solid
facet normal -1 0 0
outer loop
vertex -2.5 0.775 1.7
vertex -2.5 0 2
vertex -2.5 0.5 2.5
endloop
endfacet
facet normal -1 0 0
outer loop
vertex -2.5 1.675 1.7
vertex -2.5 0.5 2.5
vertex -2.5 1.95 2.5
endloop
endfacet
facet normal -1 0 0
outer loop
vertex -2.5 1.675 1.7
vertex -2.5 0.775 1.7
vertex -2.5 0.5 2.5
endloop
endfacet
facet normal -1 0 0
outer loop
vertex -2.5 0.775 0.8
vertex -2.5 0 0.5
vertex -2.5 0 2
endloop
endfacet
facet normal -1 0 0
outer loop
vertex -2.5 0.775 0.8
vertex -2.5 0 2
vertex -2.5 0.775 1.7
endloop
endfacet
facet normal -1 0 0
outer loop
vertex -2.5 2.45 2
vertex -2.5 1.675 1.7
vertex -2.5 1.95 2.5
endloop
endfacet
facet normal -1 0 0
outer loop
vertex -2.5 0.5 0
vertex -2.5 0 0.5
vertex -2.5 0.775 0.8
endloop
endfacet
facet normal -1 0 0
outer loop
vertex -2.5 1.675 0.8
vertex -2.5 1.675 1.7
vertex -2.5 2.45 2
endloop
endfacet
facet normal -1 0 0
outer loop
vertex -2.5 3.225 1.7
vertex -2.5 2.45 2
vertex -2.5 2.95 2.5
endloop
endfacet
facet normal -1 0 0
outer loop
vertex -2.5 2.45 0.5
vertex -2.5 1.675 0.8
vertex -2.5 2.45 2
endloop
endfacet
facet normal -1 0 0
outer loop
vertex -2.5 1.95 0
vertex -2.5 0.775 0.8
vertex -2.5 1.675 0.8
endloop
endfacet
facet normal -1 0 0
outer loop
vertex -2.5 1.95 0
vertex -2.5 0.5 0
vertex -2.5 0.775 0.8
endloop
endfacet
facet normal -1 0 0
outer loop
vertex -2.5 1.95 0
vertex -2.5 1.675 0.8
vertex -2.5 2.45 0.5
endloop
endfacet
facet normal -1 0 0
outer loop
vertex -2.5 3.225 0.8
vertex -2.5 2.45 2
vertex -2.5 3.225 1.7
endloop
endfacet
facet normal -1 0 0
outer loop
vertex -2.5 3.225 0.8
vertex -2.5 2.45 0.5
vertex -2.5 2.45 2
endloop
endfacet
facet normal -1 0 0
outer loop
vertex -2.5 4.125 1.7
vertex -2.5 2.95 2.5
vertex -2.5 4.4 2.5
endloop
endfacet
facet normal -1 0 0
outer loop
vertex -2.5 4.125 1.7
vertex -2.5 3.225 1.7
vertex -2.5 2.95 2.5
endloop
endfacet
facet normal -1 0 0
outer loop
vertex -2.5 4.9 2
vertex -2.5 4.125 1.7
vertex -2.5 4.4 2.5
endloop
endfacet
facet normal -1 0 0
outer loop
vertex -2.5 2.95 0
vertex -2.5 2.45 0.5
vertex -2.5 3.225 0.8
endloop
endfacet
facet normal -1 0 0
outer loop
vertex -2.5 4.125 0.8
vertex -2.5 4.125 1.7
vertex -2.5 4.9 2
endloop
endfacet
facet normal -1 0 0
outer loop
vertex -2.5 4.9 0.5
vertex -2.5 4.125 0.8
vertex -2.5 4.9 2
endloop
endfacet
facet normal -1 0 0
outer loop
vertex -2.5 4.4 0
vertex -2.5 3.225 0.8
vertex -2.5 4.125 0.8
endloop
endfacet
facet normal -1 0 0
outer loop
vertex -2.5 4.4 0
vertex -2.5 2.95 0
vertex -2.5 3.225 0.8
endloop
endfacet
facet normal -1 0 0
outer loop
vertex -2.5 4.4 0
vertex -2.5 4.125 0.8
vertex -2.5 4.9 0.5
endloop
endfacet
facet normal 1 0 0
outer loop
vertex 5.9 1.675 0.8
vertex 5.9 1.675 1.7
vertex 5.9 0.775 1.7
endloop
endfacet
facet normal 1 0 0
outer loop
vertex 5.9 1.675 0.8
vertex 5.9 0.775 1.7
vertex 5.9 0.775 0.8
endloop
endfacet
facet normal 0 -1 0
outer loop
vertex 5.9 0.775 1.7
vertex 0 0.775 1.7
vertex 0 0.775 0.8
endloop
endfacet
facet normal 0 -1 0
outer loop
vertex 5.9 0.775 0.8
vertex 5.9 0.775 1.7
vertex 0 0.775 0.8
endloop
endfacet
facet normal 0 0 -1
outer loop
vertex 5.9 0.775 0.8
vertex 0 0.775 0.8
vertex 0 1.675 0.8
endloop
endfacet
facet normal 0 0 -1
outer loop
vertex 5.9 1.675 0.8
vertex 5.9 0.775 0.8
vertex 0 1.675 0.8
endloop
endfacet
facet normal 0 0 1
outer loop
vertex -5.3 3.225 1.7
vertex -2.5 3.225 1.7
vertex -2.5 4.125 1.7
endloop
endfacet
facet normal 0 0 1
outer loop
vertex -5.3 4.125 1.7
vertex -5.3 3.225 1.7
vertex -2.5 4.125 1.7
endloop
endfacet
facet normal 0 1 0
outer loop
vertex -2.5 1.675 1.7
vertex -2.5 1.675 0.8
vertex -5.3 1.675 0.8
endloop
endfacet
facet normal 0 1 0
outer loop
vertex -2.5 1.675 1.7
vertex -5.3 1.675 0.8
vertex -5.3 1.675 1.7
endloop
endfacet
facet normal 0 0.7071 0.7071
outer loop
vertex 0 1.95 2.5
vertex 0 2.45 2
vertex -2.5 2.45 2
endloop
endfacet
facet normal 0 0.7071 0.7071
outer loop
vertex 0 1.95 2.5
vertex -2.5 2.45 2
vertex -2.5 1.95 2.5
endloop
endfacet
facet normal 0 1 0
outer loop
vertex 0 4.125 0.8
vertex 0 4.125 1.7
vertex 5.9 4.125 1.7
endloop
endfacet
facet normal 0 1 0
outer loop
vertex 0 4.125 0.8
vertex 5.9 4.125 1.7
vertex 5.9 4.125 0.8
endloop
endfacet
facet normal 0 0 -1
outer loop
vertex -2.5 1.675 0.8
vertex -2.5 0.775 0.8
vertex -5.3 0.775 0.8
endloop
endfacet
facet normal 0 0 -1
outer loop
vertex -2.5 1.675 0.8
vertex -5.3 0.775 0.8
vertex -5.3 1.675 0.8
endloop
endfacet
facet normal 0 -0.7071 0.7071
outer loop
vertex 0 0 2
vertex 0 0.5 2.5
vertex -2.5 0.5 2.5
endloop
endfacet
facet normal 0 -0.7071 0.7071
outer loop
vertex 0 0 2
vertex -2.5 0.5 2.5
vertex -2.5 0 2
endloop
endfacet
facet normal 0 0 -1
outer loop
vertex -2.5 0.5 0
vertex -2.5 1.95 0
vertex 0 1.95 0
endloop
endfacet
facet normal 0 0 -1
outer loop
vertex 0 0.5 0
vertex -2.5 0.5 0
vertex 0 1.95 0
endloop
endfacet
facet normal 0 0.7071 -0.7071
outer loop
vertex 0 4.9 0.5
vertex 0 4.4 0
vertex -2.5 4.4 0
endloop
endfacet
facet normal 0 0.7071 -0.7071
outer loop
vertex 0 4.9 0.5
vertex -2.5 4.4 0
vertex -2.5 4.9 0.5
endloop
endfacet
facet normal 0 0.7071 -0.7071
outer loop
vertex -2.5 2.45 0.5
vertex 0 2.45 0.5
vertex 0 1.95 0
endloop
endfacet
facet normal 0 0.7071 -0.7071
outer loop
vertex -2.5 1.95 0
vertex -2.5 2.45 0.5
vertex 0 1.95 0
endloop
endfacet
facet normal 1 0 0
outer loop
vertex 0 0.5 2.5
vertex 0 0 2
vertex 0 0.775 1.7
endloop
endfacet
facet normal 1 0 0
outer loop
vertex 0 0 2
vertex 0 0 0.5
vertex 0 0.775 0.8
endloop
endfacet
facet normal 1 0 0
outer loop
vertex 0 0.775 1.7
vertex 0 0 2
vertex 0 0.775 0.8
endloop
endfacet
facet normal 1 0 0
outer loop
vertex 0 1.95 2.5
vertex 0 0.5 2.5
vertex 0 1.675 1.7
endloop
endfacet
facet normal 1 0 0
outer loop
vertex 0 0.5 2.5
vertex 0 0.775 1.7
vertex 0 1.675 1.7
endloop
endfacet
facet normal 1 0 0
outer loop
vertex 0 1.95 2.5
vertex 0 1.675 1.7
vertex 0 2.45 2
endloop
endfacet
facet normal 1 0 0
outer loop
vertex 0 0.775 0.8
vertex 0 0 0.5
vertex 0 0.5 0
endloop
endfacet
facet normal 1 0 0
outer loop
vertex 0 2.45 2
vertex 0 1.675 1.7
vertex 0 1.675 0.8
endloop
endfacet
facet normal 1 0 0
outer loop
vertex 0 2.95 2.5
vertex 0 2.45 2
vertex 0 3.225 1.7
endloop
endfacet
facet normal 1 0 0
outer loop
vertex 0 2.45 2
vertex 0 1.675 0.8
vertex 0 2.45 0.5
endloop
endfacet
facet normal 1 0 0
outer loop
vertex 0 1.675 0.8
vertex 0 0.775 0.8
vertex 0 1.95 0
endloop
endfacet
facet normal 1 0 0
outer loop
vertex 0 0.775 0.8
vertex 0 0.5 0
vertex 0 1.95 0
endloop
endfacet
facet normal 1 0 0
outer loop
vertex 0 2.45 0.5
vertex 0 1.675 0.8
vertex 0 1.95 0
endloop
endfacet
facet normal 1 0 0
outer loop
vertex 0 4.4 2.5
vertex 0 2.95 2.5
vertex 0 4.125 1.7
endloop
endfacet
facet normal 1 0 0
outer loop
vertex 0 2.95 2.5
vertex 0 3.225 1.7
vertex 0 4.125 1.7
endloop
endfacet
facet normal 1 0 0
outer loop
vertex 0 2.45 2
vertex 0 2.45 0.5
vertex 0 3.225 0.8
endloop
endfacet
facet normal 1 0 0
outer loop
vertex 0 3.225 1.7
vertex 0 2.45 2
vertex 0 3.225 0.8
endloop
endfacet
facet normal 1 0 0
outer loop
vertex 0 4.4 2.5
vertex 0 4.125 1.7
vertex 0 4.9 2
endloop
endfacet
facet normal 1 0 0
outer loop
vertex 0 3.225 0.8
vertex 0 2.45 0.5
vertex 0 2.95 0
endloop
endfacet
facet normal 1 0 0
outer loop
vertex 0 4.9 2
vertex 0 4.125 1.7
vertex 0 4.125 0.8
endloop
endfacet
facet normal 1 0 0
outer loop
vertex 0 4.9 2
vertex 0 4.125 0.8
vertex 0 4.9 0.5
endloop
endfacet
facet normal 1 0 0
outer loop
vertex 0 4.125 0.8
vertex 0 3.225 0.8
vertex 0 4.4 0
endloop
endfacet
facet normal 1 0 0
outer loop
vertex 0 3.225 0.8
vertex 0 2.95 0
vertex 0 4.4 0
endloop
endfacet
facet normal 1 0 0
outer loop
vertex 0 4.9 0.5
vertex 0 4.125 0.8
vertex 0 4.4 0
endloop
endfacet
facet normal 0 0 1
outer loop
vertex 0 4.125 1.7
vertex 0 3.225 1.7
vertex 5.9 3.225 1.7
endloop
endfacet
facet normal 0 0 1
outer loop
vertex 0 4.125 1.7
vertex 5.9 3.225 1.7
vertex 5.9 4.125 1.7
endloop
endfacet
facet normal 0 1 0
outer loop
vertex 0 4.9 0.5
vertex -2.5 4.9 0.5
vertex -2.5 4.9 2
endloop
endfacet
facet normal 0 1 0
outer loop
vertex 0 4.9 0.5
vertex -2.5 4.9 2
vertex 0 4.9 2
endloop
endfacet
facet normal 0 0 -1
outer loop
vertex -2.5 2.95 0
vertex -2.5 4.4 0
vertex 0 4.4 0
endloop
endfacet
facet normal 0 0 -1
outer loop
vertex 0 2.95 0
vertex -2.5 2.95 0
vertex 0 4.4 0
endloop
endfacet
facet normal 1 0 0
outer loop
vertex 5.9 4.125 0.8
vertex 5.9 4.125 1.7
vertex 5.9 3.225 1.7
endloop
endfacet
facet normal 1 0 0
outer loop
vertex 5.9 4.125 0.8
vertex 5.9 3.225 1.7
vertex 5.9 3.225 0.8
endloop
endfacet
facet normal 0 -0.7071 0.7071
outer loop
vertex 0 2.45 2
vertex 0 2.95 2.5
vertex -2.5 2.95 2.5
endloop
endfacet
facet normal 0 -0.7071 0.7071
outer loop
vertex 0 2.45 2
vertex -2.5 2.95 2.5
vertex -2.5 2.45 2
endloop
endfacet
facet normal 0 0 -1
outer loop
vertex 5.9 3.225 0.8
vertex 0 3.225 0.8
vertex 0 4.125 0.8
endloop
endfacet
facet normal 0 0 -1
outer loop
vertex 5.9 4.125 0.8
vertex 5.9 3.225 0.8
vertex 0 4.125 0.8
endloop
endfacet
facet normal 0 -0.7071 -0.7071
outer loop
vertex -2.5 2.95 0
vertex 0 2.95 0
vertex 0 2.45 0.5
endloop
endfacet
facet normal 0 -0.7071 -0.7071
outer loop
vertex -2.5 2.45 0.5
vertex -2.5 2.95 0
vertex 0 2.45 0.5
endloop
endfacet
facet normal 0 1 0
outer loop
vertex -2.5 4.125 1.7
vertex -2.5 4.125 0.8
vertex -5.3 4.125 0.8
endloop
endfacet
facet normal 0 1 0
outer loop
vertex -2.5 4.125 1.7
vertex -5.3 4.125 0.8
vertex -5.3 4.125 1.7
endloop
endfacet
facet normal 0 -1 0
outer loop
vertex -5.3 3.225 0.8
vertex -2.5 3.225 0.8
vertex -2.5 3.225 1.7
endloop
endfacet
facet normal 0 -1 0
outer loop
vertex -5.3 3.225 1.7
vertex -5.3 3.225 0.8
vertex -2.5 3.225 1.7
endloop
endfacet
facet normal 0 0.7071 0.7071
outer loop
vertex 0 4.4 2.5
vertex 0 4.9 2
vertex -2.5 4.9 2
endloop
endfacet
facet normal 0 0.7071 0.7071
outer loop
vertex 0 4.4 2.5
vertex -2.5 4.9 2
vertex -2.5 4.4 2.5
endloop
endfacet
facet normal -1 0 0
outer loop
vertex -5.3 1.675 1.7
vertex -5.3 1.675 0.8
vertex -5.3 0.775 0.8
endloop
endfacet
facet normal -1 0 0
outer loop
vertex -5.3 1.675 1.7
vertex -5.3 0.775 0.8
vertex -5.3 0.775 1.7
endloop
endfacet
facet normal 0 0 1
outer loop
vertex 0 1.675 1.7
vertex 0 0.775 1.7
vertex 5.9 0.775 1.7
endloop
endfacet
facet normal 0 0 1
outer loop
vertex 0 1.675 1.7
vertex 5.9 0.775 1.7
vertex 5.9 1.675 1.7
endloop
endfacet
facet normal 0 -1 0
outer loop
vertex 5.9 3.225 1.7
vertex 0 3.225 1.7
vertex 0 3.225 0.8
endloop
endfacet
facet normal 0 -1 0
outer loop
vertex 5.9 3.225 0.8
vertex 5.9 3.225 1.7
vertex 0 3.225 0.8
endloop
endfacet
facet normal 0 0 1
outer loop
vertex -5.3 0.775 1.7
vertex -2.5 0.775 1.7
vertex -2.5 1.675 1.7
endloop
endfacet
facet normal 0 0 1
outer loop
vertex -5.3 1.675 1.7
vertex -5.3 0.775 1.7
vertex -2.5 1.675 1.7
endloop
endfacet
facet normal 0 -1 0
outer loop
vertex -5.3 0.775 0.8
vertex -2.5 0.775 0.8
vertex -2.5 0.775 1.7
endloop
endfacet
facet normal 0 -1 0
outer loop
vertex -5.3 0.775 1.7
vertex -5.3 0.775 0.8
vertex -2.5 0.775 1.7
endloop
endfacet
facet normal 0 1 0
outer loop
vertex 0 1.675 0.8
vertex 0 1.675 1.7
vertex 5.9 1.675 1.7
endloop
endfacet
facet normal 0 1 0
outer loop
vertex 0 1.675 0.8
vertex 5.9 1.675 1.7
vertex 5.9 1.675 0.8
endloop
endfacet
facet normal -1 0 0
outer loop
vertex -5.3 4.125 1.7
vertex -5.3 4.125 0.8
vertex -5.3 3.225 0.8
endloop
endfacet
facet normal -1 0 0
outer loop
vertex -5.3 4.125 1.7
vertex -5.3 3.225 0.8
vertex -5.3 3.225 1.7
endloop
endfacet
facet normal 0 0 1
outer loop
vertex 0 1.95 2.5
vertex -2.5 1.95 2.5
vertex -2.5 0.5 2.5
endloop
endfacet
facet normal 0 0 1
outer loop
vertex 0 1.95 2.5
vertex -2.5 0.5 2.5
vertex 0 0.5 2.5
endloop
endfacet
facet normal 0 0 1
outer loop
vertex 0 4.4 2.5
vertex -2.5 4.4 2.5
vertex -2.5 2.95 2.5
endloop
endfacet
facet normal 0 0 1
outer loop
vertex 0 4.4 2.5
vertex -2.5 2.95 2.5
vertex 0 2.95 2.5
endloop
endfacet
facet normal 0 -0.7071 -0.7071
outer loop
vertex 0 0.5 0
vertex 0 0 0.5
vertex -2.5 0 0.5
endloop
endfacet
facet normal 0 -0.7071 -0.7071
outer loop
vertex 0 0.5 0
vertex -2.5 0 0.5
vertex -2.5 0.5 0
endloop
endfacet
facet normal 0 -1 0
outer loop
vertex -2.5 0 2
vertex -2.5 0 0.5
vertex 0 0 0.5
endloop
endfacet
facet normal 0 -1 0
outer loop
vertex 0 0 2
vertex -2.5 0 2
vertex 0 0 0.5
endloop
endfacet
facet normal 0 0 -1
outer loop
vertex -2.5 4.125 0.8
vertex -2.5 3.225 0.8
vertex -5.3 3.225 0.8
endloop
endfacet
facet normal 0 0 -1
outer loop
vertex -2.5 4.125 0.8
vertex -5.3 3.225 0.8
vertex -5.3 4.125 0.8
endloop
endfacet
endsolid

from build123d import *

# Parameters (mm, degrees)
SKICA1_W                 = 2.5
SKICA1_H                 = 4.9
P_IDAT_VYSUNUT_M1_DEPTH  = 2.5
ODEBRAT_VYSUNUT_M1_DEPTH = 2.5
SKICA4_W                 = 0.9
SKICA4_H                 = 0.9
P_IDAT_VYSUNUT_M2_DEPTH  = 5.9
SKICA5_W                 = 0.9
SKICA5_H                 = 0.9
P_IDAT_VYSUNUT_M3_DEPTH  = 2.8


with BuildPart() as part:
    # Skica1 → Přidat vysunutím1 (new body)
    with BuildSketch(Plane.XY):
        with Locations((-1.25, 2.45)):
            Rectangle(SKICA1_W, SKICA1_H)
    extrude(amount=P_IDAT_VYSUNUT_M1_DEPTH)

    # Skica3 → Odebrat vysunutím1 (cut)
    with BuildSketch(Plane(origin=(0, 0, 0), x_dir=(0, 0, -1), z_dir=(1, 0, 0))):
        Polygon((-2.5, 2.95), (-2, 2.45), (-2.5, 1.95), align=None)
        Polygon((0, 2.95), (-0.5, 2.45), (0, 1.95), align=None)
        Polygon((-2, 4.9), (-2.5, 4.4), (-2.5, 4.9), align=None)
        Polygon((-2.5, 0.5), (-2, 0), (-2.5, 0), align=None)
        Polygon((-0.5, 0), (0, 0.5), (0, 0), align=None)
        Polygon((0, 4.9), (0, 4.4), (-0.5, 4.9), align=None)
    extrude(amount=-ODEBRAT_VYSUNUT_M1_DEPTH, mode=Mode.SUBTRACT)

    # Skica4 → Přidat vysunutím2 (add)
    with BuildSketch(Plane(origin=(0, 0, 0), x_dir=(0, 0, -1), z_dir=(1, 0, 0))):
        with Locations((-1.25, 3.675)):
            Rectangle(SKICA4_W, SKICA4_H)
        with Locations((-1.25, 1.225)):
            Rectangle(SKICA4_W, SKICA4_H)
    extrude(amount=P_IDAT_VYSUNUT_M2_DEPTH)

    # Skica5 → Přidat vysunutím3 (add)
    with BuildSketch(Plane.ZY.offset(2.5)):
        with Locations((1.25, 3.675)):
            Rectangle(SKICA5_W, SKICA5_H)
        with Locations((1.25, 1.225)):
            Rectangle(SKICA5_W, SKICA5_H)
    extrude(amount=P_IDAT_VYSUNUT_M3_DEPTH)


solid = part.part
